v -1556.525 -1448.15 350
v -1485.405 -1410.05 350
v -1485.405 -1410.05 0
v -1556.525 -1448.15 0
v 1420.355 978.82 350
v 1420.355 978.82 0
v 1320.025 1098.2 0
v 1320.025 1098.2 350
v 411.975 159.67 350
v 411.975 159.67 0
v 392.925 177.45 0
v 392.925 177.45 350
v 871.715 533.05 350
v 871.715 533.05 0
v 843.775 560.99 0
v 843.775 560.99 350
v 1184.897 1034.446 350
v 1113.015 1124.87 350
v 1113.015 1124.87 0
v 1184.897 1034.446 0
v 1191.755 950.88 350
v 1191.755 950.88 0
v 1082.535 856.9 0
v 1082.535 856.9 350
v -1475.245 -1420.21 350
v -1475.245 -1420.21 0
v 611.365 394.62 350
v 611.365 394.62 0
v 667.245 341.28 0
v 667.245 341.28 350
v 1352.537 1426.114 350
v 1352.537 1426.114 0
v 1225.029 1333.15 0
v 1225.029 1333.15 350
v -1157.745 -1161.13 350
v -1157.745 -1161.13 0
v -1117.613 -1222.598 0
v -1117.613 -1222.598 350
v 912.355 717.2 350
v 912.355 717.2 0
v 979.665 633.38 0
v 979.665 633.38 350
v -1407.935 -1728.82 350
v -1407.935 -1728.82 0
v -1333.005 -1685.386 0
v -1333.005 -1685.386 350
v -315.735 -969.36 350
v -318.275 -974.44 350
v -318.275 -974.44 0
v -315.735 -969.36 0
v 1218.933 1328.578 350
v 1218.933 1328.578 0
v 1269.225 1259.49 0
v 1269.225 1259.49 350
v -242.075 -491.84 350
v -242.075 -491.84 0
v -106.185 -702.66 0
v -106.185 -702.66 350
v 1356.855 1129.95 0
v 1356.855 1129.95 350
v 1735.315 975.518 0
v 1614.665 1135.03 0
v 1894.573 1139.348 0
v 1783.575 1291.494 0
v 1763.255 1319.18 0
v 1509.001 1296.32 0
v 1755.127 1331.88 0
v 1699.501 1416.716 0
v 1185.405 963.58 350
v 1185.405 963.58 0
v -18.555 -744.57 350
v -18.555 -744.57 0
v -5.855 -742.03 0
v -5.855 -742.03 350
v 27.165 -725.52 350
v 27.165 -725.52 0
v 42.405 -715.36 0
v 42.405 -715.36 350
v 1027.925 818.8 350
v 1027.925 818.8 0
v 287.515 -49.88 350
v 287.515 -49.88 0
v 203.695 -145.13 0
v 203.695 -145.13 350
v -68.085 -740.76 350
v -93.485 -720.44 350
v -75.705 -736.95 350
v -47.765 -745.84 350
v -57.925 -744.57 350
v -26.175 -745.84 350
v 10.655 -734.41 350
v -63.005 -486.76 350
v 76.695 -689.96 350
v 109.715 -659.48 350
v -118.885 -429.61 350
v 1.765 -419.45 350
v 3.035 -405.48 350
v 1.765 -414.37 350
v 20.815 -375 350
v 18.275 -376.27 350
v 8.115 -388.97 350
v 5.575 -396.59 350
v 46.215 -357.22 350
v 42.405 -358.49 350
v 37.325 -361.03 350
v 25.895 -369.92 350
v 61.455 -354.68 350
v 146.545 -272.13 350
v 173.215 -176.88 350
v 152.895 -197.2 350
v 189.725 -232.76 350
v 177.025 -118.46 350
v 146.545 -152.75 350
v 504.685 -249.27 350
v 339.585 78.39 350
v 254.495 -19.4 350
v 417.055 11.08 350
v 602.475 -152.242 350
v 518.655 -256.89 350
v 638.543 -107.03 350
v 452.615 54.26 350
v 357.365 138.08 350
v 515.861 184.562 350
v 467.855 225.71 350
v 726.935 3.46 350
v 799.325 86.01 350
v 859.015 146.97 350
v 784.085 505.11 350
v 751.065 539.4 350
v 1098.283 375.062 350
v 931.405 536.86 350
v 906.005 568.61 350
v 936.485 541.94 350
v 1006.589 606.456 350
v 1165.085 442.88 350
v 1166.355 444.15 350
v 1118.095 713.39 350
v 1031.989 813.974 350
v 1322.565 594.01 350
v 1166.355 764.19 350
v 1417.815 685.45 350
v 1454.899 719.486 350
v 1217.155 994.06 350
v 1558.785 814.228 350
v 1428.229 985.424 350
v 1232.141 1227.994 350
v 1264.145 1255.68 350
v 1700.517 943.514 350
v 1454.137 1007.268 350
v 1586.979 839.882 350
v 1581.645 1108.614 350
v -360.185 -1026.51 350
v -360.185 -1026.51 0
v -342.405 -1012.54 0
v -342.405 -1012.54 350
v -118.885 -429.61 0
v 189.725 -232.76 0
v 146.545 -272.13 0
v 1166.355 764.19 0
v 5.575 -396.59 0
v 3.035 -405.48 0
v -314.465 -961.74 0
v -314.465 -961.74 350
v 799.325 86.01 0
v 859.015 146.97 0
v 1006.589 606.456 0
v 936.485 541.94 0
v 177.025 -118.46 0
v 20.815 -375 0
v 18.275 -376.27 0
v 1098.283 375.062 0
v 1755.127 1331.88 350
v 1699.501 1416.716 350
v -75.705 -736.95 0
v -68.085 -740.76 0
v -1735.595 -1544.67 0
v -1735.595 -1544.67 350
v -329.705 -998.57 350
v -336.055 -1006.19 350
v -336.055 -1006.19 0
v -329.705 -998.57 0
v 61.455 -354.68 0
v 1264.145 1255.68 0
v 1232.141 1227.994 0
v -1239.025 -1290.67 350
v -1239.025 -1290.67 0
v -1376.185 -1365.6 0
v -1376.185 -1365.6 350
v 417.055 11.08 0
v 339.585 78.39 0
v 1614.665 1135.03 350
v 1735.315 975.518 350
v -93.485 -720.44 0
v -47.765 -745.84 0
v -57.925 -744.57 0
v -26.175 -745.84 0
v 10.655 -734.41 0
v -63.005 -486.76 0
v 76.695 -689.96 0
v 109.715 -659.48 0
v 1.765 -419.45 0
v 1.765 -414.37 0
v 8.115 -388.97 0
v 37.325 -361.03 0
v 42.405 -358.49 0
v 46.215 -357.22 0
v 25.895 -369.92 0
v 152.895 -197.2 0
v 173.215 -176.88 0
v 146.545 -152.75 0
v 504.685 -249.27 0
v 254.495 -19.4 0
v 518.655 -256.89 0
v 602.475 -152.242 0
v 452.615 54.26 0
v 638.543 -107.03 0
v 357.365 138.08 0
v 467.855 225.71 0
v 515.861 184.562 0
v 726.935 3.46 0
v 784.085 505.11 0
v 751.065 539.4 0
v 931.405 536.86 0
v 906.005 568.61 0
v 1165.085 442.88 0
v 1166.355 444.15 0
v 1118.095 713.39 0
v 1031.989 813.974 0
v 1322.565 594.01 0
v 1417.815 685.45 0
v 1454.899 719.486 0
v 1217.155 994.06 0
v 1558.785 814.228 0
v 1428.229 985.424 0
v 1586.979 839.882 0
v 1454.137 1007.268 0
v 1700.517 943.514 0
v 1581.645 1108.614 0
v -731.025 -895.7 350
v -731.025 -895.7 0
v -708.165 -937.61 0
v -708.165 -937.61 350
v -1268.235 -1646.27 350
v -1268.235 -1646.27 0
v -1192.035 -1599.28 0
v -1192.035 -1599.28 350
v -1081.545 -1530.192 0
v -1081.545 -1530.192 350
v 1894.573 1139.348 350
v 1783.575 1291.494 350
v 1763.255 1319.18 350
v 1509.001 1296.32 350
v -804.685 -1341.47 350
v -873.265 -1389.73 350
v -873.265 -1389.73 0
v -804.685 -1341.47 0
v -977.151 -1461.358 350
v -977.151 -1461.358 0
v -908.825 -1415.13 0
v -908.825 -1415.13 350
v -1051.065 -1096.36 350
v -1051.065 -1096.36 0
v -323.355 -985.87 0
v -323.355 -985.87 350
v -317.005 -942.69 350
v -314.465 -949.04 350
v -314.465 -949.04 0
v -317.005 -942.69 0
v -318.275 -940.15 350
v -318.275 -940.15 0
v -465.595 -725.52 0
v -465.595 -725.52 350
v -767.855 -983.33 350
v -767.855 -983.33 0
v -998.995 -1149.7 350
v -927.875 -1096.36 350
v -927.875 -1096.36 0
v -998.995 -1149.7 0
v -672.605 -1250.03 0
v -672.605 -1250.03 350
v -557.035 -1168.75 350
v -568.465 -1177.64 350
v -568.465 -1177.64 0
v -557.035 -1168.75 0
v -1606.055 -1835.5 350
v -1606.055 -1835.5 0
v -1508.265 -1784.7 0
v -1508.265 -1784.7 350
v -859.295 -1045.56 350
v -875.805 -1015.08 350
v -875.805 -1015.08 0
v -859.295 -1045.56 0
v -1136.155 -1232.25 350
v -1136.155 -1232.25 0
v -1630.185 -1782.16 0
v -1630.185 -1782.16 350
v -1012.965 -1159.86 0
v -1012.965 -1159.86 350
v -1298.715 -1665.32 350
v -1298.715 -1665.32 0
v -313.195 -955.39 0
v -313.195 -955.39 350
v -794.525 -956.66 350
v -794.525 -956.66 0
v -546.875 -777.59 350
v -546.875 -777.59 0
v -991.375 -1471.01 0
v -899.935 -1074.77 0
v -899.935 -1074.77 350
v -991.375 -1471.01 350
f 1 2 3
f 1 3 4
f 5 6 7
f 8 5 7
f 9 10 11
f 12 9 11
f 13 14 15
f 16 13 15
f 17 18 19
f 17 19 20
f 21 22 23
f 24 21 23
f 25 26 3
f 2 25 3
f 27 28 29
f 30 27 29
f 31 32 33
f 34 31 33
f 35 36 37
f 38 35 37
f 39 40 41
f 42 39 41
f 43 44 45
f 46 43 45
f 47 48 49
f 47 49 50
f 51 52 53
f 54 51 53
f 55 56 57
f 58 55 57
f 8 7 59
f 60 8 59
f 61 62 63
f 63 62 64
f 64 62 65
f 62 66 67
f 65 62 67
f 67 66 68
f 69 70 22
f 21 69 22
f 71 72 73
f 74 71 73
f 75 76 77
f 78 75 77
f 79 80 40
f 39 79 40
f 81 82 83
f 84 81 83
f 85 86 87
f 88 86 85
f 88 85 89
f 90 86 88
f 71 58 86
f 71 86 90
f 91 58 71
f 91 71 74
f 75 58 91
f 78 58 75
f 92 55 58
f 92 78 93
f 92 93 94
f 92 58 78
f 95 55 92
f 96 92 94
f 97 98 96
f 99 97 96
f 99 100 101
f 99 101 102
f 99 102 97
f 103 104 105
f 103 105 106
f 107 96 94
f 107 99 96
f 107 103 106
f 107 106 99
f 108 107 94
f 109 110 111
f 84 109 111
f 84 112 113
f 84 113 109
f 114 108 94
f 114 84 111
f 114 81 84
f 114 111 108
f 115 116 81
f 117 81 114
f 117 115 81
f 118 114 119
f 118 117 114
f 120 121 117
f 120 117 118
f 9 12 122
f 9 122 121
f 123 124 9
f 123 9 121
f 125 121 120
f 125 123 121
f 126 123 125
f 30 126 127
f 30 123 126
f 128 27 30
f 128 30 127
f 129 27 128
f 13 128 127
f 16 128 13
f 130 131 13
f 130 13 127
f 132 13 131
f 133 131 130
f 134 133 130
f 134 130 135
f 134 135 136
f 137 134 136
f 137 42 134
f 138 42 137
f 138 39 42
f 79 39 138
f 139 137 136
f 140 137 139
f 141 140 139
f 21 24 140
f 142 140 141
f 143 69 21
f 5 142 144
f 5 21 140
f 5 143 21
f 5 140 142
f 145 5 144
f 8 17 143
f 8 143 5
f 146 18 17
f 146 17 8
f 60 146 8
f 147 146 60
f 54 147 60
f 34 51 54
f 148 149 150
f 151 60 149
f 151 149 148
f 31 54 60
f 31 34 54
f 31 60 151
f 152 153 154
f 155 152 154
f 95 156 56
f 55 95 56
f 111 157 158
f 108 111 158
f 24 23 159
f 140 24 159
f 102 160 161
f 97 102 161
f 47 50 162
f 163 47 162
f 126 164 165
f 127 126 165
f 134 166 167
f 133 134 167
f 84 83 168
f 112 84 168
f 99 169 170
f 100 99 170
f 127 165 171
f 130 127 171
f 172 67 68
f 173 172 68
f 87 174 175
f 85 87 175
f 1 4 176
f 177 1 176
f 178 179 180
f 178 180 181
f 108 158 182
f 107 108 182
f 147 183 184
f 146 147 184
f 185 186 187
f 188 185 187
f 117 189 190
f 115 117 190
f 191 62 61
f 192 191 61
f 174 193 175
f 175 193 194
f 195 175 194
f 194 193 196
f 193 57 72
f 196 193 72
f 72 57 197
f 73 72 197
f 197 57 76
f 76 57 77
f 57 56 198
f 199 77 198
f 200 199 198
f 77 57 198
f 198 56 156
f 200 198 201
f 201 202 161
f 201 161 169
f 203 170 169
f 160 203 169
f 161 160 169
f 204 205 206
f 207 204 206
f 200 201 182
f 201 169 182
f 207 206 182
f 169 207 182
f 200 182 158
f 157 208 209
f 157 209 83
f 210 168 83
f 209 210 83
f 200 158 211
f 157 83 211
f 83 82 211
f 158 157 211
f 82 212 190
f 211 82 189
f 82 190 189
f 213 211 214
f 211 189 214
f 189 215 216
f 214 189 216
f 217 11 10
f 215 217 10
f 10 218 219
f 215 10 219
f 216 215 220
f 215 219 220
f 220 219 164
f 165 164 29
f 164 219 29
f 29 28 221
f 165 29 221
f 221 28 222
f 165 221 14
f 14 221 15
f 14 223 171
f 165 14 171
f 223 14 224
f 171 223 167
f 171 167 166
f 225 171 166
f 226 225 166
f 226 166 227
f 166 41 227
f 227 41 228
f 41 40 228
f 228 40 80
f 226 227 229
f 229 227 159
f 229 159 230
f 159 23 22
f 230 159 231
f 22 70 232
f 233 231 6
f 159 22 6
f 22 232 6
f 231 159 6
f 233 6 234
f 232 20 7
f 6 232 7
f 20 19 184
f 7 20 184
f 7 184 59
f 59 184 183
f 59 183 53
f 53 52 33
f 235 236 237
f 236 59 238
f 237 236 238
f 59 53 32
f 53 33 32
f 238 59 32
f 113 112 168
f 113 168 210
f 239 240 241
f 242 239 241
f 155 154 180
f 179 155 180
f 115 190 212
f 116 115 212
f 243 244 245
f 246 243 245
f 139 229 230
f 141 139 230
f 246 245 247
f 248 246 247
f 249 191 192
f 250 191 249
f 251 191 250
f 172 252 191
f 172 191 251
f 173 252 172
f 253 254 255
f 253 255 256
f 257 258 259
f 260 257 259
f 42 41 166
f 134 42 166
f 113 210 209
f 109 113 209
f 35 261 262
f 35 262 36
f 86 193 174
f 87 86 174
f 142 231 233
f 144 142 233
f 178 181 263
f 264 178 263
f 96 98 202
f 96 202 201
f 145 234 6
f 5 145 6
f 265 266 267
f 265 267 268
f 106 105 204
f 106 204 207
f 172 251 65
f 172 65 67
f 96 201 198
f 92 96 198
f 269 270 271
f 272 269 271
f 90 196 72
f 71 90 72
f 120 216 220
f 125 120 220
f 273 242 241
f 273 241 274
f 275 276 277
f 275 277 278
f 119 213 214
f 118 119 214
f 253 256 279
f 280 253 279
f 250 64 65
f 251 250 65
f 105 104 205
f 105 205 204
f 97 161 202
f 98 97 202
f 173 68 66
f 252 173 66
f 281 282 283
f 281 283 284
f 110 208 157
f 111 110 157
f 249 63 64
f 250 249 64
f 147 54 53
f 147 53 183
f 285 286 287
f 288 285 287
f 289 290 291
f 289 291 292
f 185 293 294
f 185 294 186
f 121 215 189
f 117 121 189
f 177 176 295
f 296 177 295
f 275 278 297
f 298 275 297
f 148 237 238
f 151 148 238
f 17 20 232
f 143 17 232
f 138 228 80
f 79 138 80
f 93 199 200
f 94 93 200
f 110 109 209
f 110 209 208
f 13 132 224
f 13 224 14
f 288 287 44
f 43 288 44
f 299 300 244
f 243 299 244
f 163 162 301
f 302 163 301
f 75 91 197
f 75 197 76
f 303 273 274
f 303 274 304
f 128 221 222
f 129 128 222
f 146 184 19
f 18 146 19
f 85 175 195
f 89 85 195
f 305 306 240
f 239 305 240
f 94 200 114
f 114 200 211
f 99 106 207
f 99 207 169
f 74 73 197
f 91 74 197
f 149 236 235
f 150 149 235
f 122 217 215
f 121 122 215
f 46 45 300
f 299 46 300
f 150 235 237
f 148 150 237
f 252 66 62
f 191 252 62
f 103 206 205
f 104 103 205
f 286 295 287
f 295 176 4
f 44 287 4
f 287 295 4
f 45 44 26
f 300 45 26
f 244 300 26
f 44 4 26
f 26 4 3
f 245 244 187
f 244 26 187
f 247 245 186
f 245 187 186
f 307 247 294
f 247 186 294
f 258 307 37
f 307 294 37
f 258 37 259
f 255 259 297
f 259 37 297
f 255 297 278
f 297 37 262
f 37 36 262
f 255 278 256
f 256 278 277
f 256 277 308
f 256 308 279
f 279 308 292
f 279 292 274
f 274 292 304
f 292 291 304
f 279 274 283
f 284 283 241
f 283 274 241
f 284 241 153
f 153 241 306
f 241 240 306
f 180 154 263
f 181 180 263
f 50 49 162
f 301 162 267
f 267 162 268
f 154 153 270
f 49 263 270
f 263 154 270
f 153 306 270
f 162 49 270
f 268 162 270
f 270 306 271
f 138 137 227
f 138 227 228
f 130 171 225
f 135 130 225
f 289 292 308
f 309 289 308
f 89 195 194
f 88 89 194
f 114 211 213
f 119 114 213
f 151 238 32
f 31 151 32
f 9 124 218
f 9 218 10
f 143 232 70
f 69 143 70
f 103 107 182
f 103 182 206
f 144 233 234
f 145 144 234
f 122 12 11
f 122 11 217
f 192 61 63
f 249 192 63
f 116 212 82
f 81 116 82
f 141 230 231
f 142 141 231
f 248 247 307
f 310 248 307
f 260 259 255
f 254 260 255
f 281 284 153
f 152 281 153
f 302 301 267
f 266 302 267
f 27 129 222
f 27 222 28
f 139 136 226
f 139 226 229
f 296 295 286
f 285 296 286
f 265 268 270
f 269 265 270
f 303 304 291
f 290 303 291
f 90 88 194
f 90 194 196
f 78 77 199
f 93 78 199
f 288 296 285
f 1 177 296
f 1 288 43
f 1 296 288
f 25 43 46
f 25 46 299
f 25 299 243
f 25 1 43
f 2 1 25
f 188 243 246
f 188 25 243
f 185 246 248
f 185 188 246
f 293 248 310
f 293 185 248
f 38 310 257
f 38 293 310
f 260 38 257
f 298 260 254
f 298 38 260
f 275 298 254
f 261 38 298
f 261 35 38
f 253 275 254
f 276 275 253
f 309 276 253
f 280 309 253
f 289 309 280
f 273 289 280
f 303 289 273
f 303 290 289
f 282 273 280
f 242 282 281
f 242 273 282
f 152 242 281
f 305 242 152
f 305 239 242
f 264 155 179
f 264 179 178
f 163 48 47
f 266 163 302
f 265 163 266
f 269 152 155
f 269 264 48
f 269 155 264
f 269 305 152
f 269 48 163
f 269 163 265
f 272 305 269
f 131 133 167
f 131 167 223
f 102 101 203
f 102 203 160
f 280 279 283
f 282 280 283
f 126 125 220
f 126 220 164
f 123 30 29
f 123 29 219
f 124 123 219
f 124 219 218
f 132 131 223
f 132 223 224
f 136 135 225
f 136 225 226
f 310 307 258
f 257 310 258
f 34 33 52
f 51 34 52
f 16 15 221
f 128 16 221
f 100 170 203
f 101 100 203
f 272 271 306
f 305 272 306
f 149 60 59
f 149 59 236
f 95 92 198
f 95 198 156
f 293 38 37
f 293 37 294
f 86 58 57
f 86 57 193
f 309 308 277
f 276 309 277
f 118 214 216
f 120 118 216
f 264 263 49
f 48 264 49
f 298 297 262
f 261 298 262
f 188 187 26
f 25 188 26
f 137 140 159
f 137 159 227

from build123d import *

# Parameters (mm, degrees)
F1_DEPTH = 350


with BuildPart() as f1:
    # F0 (on Top) → F1 (new body)
    with BuildSketch(Plane.XY):
        Polygon((-1735.5947, -1544.670012), (-1630.1847, -1782.160012), (-1606.0547, -1835.500012), (-1508.2647, -1784.700012), (-1407.9347, -1728.820012), (-1333.0047, -1685.386012), (-1443.4947, -1505.300012), (-1432.0647, -1497.680012), (-1475.2447, -1420.210012), (-1485.4047, -1410.050012), (-1556.5247, -1448.150012), align=None)
        Polygon((-1443.4947, -1505.300012), (-1333.0047, -1685.386012), (-1298.7147, -1665.320012), (-1268.2347, -1646.270012), (-1192.0347, -1599.280012), (-1081.5447, -1530.192012), (-1239.0247, -1290.670012), (-1376.1847, -1365.600012), (-1475.2447, -1420.210012), (-1432.0647, -1497.680012), align=None)
        Polygon((-1136.1547, -1232.250012), (-1239.0247, -1290.670012), (-1081.5447, -1530.192012), (-991.3747, -1471.010012), (-977.1507, -1461.358012), (-1117.6127, -1222.598012), align=None)
        Polygon((-1157.7447, -1161.130012), (-1117.6127, -1222.598012), (-977.1507, -1461.358012), (-908.8247, -1415.130012), (-873.2647, -1389.730012), (-1012.9647, -1159.860012), (-1051.0647, -1096.360012), align=None)
        Polygon((-557.0347, -1168.750012), (-708.1647, -937.610012), (-767.8547, -983.330012), (-794.5247, -956.660012), (-875.8047, -1015.080012), (-859.2947, -1045.560012), (-899.9347, -1074.770012), (-927.8747, -1096.360012), (-998.9947, -1149.700012), (-1012.9647, -1159.860012), (-873.2647, -1389.730012), (-804.6847, -1341.470012), (-672.6047, -1250.030012), (-568.4647, -1177.640012), align=None)
        Polygon((-546.8747, -777.590012), (-731.0247, -895.700012), (-708.1647, -937.610012), (-557.0347, -1168.750012), (-360.1847, -1026.510012), align=None)
        Polygon((-465.5947, -725.520012), (-546.8747, -777.590012), (-360.1847, -1026.510012), (-342.4047, -1012.540012), (-336.0547, -1006.190012), (-329.7047, -998.570012), (-323.3547, -985.870012), (-318.2747, -974.440012), (-315.7347, -969.360012), (-314.4647, -961.740012), (-313.1947, -955.390012), (-314.4647, -949.040012), (-317.0047, -942.690012), (-318.2747, -940.150012), align=None)
        Polygon((-118.8847, -429.610012), (-242.0747, -491.840012), (-106.1847, -702.660012), (-93.4847, -720.440012), (-75.7047, -736.950012), (-68.0847, -740.760012), (-57.9247, -744.570012), (-47.7647, -745.840012), (-26.1747, -745.840012), (-18.5547, -744.570012), (-5.8547, -742.030012), (10.6553, -734.410012), (27.1653, -725.520012), (42.4053, -715.360012), (76.6953, -689.960012), (109.7153, -659.480012), (504.6853, -249.270012), (352.2853, -113.380012), (287.5153, -49.880012), (203.6953, -145.130012), (177.0253, -118.460012), (146.5453, -152.750012), (173.2153, -176.880012), (152.8953, -197.200012), (189.7253, -232.760012), (146.5453, -272.130012), (61.4553, -354.680012), (46.2153, -357.220012), (42.4053, -358.490012), (37.3253, -361.030012), (25.8953, -369.920012), (20.8153, -375.000012), (18.2753, -376.270012), (8.1153, -388.970012), (5.5753, -396.590012), (3.0353, -405.480012), (1.7653, -414.370012), (1.7653, -419.450012), (-63.0047, -486.760012), align=None)
        Polygon((352.2853, -113.380012), (504.6853, -249.270012), (518.6553, -256.890012), (602.4753, -152.242012), (439.9153, -11.780012), (417.0553, 11.079988), (339.5853, 78.389988), (254.4953, -19.400012), (287.5153, -49.880012), align=None)
        Polygon((452.6153, 54.259988), (638.5433, -107.030012), (726.9353, 3.459988), (515.8613, 184.561988), (467.8553, 225.709988), (411.9753, 159.669988), (392.9253, 177.449988), (357.3653, 138.079988), align=None)
        Polygon((439.9153, -11.780012), (602.4753, -152.242012), (638.5433, -107.030012), (452.6153, 54.259988), (417.0553, 11.079988), align=None)
        Polygon((515.8613, 184.561988), (726.9353, 3.459988), (799.3253, 86.009988), (859.0153, 146.969988), (779.0053, 229.519988), (667.2453, 341.279988), align=None)
        Polygon((779.0053, 229.519988), (859.0153, 146.969988), (1098.2833, 375.061988), (931.4053, 536.859988), (906.0053, 568.609988), (871.7153, 533.049988), (843.7753, 560.989988), (784.0853, 505.109988), (751.0653, 539.399988), (611.3653, 394.619988), (667.2453, 341.279988), align=None)
        Polygon((931.4053, 536.859988), (1098.2833, 375.061988), (1165.0853, 442.879988), (1006.5893, 606.455988), (936.4853, 541.939988), align=None)
        Polygon((1006.5893, 606.455988), (1165.0853, 442.879988), (1166.3553, 444.149988), (1322.5653, 594.009988), (1166.3553, 764.189988), (1118.0953, 713.389988), (1031.9893, 813.973988), (1027.9253, 818.799988), (912.3553, 717.199988), (979.6653, 633.379988), align=None)
        Polygon((1166.3553, 764.189988), (1322.5653, 594.009988), (1417.8153, 685.449988), (1454.8993, 719.485988), (1283.1953, 912.779988), (1217.1553, 994.059988), (1185.4053, 963.579988), (1191.7553, 950.879988), (1082.5353, 856.899988), align=None)
        Polygon((1283.1953, 912.779988), (1454.8993, 719.485988), (1558.7853, 814.227988), (1428.2293, 985.423988), (1420.3553, 978.819988), (1320.0253, 1098.199988), (1356.8553, 1129.949988), (1269.2253, 1259.489988), (1264.1453, 1255.679988), (1232.1413, 1227.993988), (1113.0153, 1124.869988), (1184.8973, 1034.445988), (1217.1553, 994.059988), align=None)
        Polygon((1454.1373, 1007.267988), (1586.9793, 839.881988), (1700.5173, 943.513988), (1581.6453, 1108.613988), (1352.5373, 1426.113988), (1225.0293, 1333.149988), (1218.9333, 1328.577988), (1269.2253, 1259.489988), (1356.8553, 1129.949988), align=None)
        Polygon((1614.6653, 1135.029988), (1735.3153, 975.517988), (1894.5733, 1139.347988), (1783.5753, 1291.493988), (1763.2553, 1319.179988), (1755.1273, 1331.879988), (1699.5013, 1416.715988), (1509.0013, 1296.319988), align=None)
    extrude(amount=F1_DEPTH)


solid = f1.part
